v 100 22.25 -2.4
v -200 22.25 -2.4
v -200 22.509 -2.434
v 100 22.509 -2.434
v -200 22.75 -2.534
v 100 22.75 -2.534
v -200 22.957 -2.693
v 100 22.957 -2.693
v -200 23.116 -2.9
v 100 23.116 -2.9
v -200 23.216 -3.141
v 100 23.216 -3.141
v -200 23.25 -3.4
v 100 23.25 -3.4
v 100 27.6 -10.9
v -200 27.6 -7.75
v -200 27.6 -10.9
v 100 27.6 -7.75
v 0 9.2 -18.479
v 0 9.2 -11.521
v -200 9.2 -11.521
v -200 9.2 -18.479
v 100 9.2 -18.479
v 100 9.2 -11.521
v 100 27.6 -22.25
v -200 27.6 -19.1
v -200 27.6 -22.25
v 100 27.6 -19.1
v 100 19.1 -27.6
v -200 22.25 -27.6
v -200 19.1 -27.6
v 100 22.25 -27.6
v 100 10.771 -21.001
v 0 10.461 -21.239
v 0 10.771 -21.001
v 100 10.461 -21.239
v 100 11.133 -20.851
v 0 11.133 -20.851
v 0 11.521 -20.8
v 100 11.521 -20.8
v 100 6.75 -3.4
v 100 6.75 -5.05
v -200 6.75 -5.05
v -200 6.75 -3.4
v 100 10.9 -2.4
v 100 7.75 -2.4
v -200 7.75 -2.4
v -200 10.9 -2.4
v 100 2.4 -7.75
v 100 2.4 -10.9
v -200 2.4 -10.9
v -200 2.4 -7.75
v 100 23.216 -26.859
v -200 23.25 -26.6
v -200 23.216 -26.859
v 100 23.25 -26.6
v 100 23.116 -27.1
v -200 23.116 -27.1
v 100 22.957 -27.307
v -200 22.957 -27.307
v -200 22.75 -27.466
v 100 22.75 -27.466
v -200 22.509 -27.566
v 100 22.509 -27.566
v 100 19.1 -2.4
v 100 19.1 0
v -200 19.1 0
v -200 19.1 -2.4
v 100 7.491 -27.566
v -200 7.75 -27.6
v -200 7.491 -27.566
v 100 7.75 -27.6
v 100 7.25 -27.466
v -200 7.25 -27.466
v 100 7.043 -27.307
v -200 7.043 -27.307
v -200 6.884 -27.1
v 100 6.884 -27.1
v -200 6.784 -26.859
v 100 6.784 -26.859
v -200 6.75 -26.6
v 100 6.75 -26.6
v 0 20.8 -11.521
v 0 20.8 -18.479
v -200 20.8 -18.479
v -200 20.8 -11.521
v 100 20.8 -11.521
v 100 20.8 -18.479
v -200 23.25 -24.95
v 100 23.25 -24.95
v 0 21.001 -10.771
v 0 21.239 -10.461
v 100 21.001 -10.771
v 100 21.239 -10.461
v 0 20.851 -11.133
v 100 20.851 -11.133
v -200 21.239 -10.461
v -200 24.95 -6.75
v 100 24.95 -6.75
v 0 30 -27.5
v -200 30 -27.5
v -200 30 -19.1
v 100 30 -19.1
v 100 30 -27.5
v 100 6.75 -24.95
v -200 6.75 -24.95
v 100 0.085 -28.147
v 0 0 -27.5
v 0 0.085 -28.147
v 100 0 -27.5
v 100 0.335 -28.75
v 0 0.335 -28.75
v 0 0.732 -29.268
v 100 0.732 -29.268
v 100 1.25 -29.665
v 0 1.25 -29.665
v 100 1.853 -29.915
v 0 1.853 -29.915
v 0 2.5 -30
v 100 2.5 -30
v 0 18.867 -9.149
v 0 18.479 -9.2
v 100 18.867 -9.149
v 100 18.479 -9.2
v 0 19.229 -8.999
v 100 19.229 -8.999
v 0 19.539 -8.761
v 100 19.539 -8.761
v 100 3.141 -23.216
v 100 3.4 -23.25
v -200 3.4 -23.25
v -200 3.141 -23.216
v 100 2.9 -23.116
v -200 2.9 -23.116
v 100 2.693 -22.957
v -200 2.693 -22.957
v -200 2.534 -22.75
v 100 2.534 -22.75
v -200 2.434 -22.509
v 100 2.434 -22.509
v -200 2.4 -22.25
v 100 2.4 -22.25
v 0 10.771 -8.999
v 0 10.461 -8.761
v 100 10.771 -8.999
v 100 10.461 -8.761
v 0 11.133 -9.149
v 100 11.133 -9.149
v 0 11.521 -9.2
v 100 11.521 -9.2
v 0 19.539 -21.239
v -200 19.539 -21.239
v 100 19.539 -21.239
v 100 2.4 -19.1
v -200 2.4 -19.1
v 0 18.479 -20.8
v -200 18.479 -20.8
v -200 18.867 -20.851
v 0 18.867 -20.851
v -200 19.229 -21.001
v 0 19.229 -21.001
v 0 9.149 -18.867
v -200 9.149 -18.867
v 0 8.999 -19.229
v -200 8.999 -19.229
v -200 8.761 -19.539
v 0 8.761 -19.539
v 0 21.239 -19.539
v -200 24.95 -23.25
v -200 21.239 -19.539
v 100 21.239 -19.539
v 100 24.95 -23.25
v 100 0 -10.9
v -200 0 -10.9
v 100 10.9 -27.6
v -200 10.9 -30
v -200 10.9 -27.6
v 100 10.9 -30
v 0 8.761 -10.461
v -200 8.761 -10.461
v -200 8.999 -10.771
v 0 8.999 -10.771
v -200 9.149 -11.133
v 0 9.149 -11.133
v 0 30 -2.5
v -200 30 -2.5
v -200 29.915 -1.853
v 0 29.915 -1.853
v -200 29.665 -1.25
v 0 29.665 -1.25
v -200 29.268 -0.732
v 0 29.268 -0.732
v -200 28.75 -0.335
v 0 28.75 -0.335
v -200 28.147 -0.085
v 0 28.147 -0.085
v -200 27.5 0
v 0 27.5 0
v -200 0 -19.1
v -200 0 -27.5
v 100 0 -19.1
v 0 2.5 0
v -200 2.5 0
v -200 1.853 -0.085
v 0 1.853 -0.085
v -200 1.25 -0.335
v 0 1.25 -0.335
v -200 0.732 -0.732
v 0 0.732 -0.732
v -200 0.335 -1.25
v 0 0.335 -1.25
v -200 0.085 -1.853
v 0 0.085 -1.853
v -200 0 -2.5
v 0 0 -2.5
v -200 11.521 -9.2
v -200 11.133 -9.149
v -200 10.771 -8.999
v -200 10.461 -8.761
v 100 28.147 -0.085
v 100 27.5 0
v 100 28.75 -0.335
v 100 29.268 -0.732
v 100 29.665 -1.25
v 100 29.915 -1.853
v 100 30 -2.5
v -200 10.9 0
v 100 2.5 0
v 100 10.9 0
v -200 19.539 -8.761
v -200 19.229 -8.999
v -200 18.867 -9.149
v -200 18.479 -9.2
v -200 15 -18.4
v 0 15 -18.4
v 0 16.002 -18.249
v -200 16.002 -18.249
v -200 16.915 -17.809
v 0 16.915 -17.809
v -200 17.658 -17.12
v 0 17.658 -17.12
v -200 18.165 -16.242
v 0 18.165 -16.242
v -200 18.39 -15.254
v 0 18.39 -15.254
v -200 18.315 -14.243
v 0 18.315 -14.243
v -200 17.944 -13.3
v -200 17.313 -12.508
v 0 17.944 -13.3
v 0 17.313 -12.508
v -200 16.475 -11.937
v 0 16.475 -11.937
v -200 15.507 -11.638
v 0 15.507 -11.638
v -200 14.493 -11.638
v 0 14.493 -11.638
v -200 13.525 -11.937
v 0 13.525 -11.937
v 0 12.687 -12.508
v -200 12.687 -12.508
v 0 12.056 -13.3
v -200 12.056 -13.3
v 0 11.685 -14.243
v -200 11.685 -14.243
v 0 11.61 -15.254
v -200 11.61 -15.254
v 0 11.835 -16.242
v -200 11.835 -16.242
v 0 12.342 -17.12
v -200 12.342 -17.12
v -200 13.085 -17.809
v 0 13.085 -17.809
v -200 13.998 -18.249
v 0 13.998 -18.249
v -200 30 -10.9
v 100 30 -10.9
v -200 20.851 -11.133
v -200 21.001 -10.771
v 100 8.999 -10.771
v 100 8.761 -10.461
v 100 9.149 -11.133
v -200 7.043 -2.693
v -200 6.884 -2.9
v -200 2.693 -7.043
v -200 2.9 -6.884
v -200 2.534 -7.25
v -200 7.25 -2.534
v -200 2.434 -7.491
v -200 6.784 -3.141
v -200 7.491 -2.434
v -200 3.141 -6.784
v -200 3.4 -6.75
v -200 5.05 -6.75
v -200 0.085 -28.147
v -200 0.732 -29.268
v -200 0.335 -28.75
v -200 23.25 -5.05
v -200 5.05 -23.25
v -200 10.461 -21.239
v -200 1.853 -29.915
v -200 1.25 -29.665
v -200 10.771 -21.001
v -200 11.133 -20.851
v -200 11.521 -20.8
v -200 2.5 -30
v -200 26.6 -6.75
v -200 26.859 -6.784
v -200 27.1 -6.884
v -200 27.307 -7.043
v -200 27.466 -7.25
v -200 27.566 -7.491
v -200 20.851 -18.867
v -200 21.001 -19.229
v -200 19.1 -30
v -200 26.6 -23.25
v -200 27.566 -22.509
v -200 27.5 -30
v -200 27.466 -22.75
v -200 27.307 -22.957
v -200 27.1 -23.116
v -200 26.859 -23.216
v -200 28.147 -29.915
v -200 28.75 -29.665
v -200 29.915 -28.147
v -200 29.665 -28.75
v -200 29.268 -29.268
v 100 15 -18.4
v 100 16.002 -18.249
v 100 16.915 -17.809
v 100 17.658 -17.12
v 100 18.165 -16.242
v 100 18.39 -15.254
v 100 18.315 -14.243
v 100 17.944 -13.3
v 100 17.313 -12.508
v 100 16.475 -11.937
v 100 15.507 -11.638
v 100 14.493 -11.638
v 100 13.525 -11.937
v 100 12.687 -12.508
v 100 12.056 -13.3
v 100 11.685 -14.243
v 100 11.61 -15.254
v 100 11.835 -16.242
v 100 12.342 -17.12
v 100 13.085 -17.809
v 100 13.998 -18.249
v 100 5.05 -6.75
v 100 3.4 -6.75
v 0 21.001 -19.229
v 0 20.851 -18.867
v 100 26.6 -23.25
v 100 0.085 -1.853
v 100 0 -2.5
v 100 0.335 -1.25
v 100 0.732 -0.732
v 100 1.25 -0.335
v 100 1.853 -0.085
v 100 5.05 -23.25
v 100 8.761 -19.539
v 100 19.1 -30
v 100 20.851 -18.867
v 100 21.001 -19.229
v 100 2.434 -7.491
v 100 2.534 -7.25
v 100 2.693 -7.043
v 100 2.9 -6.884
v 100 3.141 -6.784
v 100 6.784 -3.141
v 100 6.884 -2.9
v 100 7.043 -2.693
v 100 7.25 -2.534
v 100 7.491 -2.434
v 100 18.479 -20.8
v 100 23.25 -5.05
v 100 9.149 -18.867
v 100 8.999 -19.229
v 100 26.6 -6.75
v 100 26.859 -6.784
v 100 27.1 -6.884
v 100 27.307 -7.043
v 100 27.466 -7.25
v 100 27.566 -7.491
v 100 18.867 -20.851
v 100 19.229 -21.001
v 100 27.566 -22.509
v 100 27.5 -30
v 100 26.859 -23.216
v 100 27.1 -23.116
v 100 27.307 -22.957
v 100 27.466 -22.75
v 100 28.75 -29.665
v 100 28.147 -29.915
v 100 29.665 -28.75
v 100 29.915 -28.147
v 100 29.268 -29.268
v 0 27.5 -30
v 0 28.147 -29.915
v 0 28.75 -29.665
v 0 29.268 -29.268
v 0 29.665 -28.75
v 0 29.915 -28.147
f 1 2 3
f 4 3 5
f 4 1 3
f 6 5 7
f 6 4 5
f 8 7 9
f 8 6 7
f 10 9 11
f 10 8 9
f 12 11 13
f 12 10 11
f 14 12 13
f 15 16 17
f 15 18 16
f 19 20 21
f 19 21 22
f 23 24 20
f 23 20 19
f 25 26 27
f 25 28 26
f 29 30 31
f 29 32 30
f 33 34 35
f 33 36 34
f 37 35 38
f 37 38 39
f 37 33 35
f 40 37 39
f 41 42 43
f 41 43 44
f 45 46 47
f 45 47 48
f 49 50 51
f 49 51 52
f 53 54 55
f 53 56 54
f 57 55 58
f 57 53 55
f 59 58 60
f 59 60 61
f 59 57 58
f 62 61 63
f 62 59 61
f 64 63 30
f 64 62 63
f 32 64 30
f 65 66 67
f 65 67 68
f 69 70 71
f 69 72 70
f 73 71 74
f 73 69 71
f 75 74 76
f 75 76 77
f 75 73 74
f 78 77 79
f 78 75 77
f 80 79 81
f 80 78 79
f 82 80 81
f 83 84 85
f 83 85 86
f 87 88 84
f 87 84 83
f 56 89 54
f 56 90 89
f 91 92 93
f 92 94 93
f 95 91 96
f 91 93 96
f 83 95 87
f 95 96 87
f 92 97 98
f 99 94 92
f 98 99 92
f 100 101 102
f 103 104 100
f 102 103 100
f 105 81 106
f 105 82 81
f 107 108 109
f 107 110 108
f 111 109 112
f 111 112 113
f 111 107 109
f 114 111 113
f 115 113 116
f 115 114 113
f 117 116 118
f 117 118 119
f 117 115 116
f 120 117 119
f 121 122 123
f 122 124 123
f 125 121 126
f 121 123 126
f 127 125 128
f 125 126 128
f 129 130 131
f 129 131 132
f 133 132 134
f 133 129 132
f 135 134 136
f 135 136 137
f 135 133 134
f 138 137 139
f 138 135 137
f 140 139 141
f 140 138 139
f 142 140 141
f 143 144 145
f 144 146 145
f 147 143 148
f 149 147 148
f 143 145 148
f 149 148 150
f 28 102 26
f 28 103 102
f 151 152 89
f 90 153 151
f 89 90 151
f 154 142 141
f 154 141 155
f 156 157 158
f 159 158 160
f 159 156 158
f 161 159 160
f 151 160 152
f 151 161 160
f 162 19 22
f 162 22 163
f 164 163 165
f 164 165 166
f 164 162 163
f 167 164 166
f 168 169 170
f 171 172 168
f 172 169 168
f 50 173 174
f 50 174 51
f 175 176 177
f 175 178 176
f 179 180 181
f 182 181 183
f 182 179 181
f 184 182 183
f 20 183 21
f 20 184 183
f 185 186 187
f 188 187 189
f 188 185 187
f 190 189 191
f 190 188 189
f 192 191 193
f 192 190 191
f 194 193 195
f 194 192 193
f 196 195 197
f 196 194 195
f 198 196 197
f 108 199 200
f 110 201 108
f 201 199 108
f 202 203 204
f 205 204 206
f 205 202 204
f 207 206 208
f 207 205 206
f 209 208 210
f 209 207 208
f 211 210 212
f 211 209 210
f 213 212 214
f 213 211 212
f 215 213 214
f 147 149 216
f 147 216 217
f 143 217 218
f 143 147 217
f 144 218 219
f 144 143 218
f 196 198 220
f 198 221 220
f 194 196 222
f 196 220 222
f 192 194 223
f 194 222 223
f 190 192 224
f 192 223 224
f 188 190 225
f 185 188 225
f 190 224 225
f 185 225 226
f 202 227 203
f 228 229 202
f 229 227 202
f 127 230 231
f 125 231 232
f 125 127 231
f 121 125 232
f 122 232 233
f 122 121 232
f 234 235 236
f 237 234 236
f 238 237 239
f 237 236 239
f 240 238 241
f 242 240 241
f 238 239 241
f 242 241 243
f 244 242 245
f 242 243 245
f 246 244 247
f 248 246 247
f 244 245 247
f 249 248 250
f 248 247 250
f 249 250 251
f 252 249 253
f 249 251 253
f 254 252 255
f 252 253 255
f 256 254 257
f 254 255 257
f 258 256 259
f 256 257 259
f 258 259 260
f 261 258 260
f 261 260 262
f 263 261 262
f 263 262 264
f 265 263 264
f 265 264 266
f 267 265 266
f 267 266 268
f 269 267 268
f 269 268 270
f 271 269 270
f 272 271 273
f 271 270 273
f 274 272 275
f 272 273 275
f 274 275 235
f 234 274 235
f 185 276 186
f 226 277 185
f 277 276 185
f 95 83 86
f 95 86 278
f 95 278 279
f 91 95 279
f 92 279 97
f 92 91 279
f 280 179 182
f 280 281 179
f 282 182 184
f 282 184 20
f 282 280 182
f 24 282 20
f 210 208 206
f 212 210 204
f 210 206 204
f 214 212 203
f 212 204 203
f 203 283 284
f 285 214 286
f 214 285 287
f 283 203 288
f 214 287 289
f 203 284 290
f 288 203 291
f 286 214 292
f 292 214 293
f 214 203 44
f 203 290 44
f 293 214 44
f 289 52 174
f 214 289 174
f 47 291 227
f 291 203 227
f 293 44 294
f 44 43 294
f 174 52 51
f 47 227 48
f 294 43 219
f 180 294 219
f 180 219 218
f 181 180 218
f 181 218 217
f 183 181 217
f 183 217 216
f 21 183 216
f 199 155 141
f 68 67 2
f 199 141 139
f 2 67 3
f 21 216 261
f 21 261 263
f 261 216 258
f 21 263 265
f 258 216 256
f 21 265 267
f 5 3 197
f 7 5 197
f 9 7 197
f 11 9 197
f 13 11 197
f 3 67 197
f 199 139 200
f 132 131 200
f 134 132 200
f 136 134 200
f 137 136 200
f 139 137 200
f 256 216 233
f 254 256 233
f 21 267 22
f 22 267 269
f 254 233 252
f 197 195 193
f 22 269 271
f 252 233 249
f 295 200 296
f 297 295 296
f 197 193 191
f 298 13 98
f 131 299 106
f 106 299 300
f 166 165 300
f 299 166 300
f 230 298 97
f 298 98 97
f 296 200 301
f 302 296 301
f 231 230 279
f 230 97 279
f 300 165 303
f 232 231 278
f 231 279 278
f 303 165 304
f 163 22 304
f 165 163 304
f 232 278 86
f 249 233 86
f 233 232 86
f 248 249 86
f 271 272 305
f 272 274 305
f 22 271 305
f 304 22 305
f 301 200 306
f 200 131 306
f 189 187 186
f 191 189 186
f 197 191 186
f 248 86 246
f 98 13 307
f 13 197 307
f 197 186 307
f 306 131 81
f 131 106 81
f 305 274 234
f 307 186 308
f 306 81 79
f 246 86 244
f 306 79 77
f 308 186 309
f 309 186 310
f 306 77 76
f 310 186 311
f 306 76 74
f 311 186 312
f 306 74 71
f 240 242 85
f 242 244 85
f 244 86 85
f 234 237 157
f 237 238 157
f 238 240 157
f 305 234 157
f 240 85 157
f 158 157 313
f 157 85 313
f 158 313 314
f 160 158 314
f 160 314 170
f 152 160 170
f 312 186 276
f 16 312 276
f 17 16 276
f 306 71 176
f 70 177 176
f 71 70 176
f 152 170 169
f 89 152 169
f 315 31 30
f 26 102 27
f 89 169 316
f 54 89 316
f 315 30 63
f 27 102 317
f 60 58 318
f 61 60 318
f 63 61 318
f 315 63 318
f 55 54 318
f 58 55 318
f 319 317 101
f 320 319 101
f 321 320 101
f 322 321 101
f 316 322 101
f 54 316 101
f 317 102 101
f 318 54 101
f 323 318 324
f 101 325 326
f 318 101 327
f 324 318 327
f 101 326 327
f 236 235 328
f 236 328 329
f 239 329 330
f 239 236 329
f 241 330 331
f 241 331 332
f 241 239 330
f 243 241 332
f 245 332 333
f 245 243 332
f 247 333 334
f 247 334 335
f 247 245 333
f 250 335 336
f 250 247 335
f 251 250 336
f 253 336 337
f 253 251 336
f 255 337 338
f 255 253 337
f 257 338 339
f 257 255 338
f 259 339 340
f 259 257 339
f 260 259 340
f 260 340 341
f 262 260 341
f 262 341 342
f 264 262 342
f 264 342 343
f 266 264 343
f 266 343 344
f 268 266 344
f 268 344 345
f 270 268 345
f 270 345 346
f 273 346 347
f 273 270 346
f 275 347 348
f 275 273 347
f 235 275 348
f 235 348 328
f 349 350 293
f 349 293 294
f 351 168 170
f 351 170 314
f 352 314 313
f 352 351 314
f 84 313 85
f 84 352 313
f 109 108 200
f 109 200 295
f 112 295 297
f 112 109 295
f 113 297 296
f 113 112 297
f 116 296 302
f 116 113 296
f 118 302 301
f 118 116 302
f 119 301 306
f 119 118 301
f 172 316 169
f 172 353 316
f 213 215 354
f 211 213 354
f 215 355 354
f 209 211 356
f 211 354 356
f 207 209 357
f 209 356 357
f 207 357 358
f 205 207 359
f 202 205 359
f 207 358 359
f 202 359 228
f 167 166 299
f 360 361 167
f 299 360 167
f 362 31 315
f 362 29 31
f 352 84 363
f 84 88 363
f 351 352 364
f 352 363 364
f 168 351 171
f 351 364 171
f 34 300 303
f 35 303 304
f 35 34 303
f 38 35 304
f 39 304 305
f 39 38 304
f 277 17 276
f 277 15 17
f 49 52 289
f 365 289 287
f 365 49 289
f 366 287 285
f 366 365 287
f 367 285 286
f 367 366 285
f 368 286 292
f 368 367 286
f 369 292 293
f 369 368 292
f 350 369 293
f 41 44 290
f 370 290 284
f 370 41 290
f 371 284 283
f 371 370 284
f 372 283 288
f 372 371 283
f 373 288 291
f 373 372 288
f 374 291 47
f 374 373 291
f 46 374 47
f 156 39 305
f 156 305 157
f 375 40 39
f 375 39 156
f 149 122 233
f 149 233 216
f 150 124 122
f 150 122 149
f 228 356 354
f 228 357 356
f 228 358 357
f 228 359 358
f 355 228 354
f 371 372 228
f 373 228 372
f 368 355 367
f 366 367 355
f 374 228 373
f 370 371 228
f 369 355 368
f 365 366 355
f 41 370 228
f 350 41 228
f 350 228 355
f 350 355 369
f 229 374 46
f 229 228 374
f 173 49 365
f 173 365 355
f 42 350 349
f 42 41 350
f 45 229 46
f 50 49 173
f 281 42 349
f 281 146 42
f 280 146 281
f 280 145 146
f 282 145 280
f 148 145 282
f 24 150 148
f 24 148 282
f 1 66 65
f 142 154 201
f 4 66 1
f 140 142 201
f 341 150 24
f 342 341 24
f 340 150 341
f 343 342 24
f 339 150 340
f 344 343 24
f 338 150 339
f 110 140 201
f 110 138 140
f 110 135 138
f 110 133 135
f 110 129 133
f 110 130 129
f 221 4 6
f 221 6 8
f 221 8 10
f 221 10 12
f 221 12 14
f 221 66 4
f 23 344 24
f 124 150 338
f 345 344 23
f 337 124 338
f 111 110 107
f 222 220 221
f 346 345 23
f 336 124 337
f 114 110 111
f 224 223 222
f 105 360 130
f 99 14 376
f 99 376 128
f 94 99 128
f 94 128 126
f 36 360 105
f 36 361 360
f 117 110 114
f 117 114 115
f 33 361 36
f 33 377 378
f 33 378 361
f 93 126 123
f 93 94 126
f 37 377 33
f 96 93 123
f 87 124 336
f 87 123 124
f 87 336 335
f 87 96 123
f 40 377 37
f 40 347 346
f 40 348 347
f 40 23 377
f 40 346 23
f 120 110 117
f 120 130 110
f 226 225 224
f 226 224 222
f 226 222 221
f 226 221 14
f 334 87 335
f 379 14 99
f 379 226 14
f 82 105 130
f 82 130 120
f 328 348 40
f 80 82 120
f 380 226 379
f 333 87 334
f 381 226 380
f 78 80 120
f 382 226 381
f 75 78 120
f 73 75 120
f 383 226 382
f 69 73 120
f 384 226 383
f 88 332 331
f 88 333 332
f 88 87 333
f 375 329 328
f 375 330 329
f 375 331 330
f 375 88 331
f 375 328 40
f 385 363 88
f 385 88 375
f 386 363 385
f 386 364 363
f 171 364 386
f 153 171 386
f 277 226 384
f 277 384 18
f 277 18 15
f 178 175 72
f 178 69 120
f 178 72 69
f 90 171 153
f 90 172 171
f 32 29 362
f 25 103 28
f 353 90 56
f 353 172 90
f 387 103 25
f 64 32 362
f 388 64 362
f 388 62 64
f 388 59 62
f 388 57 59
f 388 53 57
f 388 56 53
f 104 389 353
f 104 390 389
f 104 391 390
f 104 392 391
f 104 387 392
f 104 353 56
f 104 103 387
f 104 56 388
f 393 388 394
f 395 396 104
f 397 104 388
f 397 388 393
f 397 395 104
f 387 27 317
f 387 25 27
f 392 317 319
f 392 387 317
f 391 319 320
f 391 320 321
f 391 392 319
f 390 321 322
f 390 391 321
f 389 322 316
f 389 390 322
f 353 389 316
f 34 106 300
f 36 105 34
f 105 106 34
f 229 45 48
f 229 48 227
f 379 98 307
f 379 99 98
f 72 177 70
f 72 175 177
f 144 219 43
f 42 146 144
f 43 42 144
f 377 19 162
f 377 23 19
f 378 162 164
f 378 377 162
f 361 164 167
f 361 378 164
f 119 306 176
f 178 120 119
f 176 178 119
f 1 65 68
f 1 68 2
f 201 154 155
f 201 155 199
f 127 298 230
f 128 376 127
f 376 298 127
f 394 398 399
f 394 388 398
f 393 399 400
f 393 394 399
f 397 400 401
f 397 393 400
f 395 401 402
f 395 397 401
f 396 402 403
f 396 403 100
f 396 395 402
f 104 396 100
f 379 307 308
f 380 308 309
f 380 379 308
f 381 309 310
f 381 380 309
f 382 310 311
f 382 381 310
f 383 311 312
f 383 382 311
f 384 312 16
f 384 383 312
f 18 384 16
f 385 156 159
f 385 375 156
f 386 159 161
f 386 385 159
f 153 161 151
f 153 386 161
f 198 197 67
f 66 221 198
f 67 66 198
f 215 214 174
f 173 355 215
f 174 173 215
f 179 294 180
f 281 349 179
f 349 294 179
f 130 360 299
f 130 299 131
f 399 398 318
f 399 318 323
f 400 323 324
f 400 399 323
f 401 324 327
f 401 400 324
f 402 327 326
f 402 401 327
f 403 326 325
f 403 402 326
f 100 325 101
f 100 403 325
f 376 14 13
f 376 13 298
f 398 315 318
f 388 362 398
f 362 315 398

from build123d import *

# Parameters (mm, degrees)
SKETCH1_R           = 3.4
BOSS_EXTRUDE2_DEPTH = 100
FILLET5_R           = 2.5
FILLET6_R           = 1.5
FILLET7_R           = 1.5
FILLET8_R           = 1
SKETCH3_R           = 3.4
BOSS_EXTRUDE4_DEPTH = 200


with BuildPart() as part:
    # Sketch1 → Boss-Extrude2 (new body)
    with BuildSketch(Plane(origin=(0, 0, 0), x_dir=(0, 0, -1), z_dir=(1, 0, 0))):
        Polygon((10.9, 0), (10.9, 2.4), (6.75, 2.4), (6.75, 5.05), (10.9, 9.2), (19.1, 9.2), (23.25, 5.05), (23.25, 2.4), (19.1, 2.4), (19.1, 0), (30, 0), (30, 10.9), (27.6, 10.9), (27.6, 6.75), (24.95, 6.75), (20.8, 10.9), (20.8, 19.1), (24.95, 23.25), (27.6, 23.25), (27.6, 19.1), (30, 19.1), (30, 30), (19.1, 30), (19.1, 27.6), (23.25, 27.6), (23.25, 24.95), (19.1, 20.8), (10.9, 20.8), (6.75, 24.95), (6.75, 27.6), (10.9, 27.6), (10.9, 30), (0, 30), (0, 19.1), (2.4, 19.1), (2.4, 23.25), (5.05, 23.25), (9.2, 19.1), (9.2, 10.9), (5.05, 6.75), (2.4, 6.75), (2.4, 10.9), (0, 10.9), (0, 0), align=None)
        with Locations((15, 15)):
            Circle(SKETCH1_R, mode=Mode.SUBTRACT)
    extrude(amount=BOSS_EXTRUDE2_DEPTH)

    # Fillet5
    fillet5_edges = [part.edges().sort_by_distance(p)[0] for p in [
        (50, 30, 0),
        (50, 30, -30),
        (50, 0, -30),
        (50, 0, 0),
    ]]
    fillet(fillet5_edges, radius=FILLET5_R)

    # Fillet6
    fillet6_edges = [part.edges().sort_by_distance(p)[0] for p in [
        (50, 10.9, -9.2),
        (50, 19.1, -9.2),
        (50, 19.1, -20.8),
        (50, 10.9, -20.8),
        (50, 9.2, -19.1),
        (50, 9.2, -10.9),
    ]]
    fillet(fillet6_edges, radius=FILLET6_R)

    # Fillet7
    fillet7_edges = [part.edges().sort_by_distance(p)[0] for p in [
        (50, 20.8, -10.9),
        (50, 20.8, -19.1),
    ]]
    fillet(fillet7_edges, radius=FILLET7_R)

    # Fillet8
    fillet8_edges = [part.edges().sort_by_distance(p)[0] for p in [
        (50, 6.75, -2.4),
        (50, 23.25, -2.4),
        (50, 27.6, -6.75),
        (50, 27.6, -23.25),
        (50, 23.25, -27.6),
        (50, 6.75, -27.6),
        (50, 2.4, -23.25),
        (50, 2.4, -6.75),
    ]]
    fillet(fillet8_edges, radius=FILLET8_R)

    # Sketch3 → Boss-Extrude4 (add)
    with BuildSketch(Plane(origin=(0, 0, 0), x_dir=(0, 0, -1), z_dir=(1, 0, 0))):
        with BuildLine():
            Line((10.9, 27.6), (10.9, 30))
            Line((10.9, 30), (2.5, 30))
            ThreePointArc((2.5, 30), (0.732233047, 29.267766953), (0, 27.5))
            Line((0, 27.5), (0, 19.1))
            Line((0, 19.1), (2.4, 19.1))
            Line((2.4, 19.1), (2.4, 22.25))
            ThreePointArc((2.4, 22.25), (2.692893219, 22.957106781), (3.4, 23.25))
            Line((3.4, 23.25), (5.05, 23.25))
            Line((5.05, 23.25), (8.760660172, 19.539339828))
            ThreePointArc((8.760660172, 19.539339828), (9.085819299, 19.052704805), (9.2, 18.478679656))
            Line((9.2, 18.478679656), (9.2, 11.521320344))
            ThreePointArc((9.2, 11.521320344), (9.085819299, 10.947295195), (8.760660172, 10.460660172))
            Line((8.760660172, 10.460660172), (5.05, 6.75))
            Line((5.05, 6.75), (3.4, 6.75))
            ThreePointArc((3.4, 6.75), (2.692893219, 7.042893219), (2.4, 7.75))
            Line((2.4, 7.75), (2.4, 10.9))
            Line((2.4, 10.9), (0, 10.9))
            Line((0, 10.9), (0, 2.5))
            ThreePointArc((0, 2.5), (0.732233047, 0.732233047), (2.5, 0))
            Line((2.5, 0), (10.9, 0))
            Line((10.9, 0), (10.9, 2.4))
            Line((10.9, 2.4), (7.75, 2.4))
            ThreePointArc((7.75, 2.4), (7.042893219, 2.692893219), (6.75, 3.4))
            Line((6.75, 3.4), (6.75, 5.05))
            Line((6.75, 5.05), (10.460660172, 8.760660172))
            ThreePointArc((10.460660172, 8.760660172), (10.947295195, 9.085819299), (11.521320344, 9.2))
            Line((11.521320344, 9.2), (18.478679656, 9.2))
            ThreePointArc((18.478679656, 9.2), (19.052704805, 9.085819299), (19.539339828, 8.760660172))
            Line((19.539339828, 8.760660172), (23.25, 5.05))
            Line((23.25, 5.05), (23.25, 3.4))
            ThreePointArc((23.25, 3.4), (22.957106781, 2.692893219), (22.25, 2.4))
            Line((22.25, 2.4), (19.1, 2.4))
            Line((19.1, 2.4), (19.1, 0))
            Line((19.1, 0), (27.5, 0))
            ThreePointArc((27.5, 0), (29.267766953, 0.732233047), (30, 2.5))
            Line((30, 2.5), (30, 10.9))
            Line((30, 10.9), (27.6, 10.9))
            Line((27.6, 10.9), (27.6, 7.75))
            ThreePointArc((27.6, 7.75), (27.307106781, 7.042893219), (26.6, 6.75))
            Line((26.6, 6.75), (24.95, 6.75))
            Line((24.95, 6.75), (21.239339828, 10.460660172))
            ThreePointArc((21.239339828, 10.460660172), (20.914180701, 10.947295195), (20.8, 11.521320344))
            Line((20.8, 11.521320344), (20.8, 18.478679656))
            ThreePointArc((20.8, 18.478679656), (20.914180701, 19.052704805), (21.239339828, 19.539339828))
            Line((21.239339828, 19.539339828), (24.95, 23.25))
            Line((24.95, 23.25), (26.6, 23.25))
            ThreePointArc((26.6, 23.25), (27.307106781, 22.957106781), (27.6, 22.25))
            Line((27.6, 22.25), (27.6, 19.1))
            Line((27.6, 19.1), (30, 19.1))
            Line((30, 19.1), (30, 27.5))
            ThreePointArc((30, 27.5), (29.267766953, 29.267766953), (27.5, 30))
            Line((27.5, 30), (19.1, 30))
            Line((19.1, 30), (19.1, 27.6))
            Line((19.1, 27.6), (22.25, 27.6))
            ThreePointArc((22.25, 27.6), (22.957106781, 27.307106781), (23.25, 26.6))
            Line((23.25, 26.6), (23.25, 24.95))
            Line((23.25, 24.95), (19.539339828, 21.239339828))
            ThreePointArc((19.539339828, 21.239339828), (19.052704805, 20.914180701), (18.478679656, 20.8))
            Line((18.478679656, 20.8), (11.521320344, 20.8))
            ThreePointArc((11.521320344, 20.8), (10.947295195, 20.914180701), (10.460660172, 21.239339828))
            Line((10.460660172, 21.239339828), (6.75, 24.95))
            Line((6.75, 24.95), (6.75, 26.6))
            ThreePointArc((6.75, 26.6), (7.042893219, 27.307106781), (7.75, 27.6))
            Line((7.75, 27.6), (10.9, 27.6))
        make_face()
        with Locations((15, 15)):
            Circle(SKETCH3_R, mode=Mode.SUBTRACT)
    extrude(amount=-BOSS_EXTRUDE4_DEPTH)


solid = part.part
